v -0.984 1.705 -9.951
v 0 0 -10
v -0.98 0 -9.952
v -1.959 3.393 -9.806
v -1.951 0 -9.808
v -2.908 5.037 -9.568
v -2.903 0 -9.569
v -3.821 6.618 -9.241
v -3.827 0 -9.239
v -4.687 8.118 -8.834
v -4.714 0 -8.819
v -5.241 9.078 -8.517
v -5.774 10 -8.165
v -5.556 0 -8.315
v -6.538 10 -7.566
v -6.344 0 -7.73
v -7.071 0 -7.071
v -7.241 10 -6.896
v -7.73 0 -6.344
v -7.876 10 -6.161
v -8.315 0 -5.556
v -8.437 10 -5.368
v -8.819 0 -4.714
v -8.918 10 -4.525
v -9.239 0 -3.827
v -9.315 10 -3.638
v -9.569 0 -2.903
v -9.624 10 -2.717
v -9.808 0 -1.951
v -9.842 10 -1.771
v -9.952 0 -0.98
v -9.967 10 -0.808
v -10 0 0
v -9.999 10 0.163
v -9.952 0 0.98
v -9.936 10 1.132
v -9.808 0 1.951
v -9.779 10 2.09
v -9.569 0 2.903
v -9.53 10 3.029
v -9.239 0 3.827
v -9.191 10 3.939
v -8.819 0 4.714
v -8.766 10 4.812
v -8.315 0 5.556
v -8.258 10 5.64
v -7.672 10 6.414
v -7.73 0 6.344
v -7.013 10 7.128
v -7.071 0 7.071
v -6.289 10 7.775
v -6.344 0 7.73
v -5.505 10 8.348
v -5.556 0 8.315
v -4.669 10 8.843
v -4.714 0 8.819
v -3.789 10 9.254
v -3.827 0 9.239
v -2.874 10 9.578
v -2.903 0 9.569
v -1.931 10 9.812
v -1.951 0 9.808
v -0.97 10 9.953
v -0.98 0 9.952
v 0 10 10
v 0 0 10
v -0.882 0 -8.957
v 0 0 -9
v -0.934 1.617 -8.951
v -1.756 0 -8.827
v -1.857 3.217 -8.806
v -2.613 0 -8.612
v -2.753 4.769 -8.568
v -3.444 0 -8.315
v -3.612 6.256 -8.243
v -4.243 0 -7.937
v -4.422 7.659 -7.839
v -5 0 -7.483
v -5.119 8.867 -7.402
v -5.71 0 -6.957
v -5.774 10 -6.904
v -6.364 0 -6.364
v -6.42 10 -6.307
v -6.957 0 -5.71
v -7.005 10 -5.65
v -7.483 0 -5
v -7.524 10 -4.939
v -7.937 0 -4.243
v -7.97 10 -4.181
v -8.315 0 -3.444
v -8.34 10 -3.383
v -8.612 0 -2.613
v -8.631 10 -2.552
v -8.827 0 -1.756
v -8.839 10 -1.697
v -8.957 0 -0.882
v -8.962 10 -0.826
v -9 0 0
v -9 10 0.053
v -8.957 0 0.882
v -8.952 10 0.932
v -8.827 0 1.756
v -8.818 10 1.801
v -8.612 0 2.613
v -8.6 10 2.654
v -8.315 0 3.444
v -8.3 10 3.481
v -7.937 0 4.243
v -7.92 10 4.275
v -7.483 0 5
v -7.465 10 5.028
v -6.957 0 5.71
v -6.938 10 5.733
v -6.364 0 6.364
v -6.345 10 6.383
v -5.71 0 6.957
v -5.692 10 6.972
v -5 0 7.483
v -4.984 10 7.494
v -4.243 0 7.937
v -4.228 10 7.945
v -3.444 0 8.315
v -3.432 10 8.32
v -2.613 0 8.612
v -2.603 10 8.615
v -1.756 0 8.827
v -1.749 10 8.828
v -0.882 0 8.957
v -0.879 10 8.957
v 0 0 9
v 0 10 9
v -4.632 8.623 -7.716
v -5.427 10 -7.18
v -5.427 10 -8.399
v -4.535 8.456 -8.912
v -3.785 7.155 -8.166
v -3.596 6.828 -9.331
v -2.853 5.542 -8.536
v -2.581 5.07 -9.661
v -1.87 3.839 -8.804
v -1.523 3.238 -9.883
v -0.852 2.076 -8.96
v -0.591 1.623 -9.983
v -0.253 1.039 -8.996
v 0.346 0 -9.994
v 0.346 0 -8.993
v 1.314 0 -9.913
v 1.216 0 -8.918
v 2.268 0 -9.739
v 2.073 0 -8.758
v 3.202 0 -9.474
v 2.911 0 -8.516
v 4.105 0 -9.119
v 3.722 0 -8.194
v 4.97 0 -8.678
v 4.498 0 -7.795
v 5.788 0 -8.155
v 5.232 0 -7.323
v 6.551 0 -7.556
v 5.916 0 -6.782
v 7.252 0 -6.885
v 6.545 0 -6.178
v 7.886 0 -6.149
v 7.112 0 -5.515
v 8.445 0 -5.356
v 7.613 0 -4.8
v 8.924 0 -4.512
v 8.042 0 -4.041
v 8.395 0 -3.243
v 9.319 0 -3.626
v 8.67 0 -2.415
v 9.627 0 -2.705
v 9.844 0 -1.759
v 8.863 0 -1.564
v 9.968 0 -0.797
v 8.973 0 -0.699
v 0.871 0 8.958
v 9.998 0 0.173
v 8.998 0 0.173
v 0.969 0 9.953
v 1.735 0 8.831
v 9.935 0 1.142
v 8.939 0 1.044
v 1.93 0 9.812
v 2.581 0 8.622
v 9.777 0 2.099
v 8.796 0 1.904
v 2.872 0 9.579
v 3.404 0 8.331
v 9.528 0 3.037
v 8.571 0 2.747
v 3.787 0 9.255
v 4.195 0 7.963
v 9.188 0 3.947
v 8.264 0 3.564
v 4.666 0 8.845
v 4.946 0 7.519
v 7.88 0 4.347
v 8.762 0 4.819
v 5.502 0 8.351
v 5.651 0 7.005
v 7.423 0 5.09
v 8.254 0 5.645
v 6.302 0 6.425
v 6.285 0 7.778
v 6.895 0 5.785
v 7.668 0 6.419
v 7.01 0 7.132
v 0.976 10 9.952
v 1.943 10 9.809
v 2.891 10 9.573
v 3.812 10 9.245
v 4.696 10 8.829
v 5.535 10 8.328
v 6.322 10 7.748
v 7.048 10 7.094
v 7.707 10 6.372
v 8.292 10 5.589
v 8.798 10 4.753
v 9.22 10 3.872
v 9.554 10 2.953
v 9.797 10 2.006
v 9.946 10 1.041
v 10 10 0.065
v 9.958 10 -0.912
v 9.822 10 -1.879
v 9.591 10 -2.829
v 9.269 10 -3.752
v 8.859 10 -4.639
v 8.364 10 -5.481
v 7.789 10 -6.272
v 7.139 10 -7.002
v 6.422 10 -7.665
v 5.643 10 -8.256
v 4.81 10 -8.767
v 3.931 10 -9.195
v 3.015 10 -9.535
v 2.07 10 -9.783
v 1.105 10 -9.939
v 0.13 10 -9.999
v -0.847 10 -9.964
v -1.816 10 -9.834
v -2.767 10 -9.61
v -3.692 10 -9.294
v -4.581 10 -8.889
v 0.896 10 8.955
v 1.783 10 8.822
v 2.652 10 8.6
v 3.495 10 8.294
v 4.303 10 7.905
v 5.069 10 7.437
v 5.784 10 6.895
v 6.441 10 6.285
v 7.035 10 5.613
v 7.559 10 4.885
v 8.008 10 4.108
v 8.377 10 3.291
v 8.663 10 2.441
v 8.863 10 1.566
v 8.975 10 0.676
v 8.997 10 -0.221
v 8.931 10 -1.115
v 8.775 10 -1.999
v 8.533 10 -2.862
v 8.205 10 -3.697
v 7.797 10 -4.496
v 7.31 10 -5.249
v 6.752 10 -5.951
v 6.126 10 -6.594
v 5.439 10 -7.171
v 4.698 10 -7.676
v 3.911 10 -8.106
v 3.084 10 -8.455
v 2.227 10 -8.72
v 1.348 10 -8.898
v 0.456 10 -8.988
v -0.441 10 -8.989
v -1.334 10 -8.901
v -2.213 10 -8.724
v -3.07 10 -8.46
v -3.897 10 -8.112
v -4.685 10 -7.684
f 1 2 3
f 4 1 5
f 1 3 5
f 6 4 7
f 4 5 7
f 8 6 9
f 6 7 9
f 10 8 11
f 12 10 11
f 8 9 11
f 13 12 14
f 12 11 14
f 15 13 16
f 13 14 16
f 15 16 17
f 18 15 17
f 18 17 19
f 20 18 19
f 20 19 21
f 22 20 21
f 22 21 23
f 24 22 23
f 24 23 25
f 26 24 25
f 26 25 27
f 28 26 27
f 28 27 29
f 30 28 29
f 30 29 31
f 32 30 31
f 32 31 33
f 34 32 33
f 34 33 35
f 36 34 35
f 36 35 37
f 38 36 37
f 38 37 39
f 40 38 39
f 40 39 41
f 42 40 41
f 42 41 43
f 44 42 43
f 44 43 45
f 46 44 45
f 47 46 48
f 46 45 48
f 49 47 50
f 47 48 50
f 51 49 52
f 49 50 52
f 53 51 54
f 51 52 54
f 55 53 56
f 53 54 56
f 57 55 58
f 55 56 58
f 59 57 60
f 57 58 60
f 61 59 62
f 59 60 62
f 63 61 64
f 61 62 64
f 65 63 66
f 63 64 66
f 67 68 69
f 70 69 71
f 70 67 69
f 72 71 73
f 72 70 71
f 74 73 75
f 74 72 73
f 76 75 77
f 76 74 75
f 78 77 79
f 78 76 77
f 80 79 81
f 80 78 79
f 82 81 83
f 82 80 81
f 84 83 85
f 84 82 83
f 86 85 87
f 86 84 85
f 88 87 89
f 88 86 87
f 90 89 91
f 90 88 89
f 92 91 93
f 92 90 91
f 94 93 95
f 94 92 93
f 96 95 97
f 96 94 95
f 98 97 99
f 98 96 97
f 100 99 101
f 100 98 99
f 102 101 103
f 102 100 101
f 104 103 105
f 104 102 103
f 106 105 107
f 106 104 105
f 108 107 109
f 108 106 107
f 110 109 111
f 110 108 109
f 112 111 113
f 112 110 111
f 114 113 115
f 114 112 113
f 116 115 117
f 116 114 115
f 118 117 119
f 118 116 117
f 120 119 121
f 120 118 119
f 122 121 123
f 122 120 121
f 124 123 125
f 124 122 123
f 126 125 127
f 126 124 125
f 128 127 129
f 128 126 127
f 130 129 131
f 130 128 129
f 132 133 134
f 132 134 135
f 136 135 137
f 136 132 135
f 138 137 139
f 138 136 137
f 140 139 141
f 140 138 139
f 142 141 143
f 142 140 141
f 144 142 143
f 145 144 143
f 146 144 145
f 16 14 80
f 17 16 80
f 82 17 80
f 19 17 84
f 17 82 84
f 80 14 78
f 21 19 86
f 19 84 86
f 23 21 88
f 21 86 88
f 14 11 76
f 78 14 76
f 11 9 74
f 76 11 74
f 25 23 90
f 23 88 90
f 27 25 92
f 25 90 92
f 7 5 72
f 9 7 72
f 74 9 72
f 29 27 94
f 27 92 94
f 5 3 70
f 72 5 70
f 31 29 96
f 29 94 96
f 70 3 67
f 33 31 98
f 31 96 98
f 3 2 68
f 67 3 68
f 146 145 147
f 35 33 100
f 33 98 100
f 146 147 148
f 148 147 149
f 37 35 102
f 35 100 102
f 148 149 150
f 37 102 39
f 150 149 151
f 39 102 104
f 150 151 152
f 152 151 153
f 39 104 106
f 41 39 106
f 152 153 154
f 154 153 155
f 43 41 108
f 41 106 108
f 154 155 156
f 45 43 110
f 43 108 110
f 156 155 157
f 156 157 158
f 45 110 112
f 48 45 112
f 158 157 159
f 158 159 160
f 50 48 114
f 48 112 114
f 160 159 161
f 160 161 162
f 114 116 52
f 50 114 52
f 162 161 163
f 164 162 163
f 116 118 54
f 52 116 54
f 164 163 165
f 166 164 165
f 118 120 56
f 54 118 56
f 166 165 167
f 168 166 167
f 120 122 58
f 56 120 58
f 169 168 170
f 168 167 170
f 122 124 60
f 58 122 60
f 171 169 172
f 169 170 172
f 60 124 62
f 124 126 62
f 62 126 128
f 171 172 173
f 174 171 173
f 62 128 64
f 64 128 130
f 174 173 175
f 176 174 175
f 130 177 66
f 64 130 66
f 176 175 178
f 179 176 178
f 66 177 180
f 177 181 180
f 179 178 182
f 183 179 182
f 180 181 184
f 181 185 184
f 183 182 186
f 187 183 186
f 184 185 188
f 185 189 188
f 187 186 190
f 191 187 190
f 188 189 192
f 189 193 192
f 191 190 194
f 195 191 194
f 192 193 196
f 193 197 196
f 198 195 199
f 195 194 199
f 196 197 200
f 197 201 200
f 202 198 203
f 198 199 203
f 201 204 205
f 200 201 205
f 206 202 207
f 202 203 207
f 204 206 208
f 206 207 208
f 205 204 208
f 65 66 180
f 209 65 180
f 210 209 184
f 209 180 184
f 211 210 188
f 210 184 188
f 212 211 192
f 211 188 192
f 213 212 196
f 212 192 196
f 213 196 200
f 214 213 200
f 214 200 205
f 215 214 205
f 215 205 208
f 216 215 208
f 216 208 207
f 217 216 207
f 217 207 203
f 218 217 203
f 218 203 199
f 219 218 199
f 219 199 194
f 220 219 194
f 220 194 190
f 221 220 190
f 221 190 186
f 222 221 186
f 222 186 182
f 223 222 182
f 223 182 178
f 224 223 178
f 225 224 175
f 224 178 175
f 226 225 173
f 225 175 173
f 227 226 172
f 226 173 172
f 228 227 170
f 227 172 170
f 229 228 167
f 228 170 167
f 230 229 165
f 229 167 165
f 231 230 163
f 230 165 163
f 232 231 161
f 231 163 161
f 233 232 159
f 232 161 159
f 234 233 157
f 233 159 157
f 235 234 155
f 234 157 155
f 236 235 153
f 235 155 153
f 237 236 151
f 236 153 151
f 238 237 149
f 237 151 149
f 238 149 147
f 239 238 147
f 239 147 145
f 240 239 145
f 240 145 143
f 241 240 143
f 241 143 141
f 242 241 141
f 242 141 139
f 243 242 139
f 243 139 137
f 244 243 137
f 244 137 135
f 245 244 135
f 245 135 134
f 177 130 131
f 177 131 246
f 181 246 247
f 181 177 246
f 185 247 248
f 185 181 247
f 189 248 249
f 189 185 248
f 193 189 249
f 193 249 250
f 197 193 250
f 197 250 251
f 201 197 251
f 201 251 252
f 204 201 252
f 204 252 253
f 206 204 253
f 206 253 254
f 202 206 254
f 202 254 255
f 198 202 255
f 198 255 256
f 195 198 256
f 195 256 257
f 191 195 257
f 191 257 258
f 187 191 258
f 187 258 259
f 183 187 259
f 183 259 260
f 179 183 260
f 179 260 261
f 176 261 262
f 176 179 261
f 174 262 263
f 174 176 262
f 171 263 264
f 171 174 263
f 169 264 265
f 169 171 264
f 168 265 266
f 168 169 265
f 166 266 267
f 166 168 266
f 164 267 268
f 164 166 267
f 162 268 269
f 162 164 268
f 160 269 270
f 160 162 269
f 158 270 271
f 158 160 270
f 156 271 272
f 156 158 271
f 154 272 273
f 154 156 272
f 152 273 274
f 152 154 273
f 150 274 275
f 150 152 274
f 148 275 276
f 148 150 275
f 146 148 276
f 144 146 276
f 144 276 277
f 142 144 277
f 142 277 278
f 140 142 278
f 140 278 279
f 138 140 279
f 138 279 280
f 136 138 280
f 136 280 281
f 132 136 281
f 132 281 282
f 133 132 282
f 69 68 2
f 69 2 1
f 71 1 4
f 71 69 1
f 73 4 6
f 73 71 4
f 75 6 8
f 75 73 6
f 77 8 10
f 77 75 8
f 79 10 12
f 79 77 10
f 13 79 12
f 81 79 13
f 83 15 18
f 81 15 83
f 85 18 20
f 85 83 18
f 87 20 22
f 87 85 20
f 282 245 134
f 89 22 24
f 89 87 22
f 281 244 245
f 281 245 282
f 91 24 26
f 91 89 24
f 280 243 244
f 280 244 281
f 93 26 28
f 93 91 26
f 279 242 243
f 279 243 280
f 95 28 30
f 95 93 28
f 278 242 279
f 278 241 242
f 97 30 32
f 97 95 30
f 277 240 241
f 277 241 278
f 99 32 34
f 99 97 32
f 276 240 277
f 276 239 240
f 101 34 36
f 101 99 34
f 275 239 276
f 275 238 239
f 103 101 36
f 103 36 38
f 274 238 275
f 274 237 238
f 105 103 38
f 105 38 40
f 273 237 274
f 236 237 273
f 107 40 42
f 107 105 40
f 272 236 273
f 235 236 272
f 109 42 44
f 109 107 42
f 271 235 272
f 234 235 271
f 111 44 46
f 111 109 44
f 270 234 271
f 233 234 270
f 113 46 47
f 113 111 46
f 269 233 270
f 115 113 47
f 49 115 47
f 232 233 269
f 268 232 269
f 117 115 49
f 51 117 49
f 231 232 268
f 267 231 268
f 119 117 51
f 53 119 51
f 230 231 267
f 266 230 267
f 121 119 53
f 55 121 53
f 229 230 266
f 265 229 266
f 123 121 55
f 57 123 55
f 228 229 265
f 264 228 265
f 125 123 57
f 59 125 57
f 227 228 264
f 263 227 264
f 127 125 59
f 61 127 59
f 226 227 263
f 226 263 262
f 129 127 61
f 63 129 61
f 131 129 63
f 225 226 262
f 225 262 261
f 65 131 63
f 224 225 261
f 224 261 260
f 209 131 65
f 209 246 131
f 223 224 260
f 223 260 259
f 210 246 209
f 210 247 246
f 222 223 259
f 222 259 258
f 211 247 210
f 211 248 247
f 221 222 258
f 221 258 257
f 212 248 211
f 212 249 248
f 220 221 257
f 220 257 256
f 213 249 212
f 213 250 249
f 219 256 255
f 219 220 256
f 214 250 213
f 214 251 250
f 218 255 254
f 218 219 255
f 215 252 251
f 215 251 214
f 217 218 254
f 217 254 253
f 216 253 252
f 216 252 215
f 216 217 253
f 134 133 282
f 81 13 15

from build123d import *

# Parameters (mm, degrees)
SKETCH1_R           = 10
SKETCH1_R_2         = 9
BOSS_EXTRUDE1_DEPTH = 10
CUT_EXTRUDE1_REACH  = 19.321


with BuildPart() as part:
    # Sketch1 → Boss-Extrude1 (new body)
    with BuildSketch(Plane(origin=(0, 0, 0), x_dir=(1, 0, 0), z_dir=(0, 1, 0))):
        with Locations(Location((0, 0, 0), (0, 0, 270))):
            Circle(SKETCH1_R)
        with Locations(Location((0, 0, 0), (0, 0, 270))):
            Circle(SKETCH1_R_2, mode=Mode.SUBTRACT)
    extrude(amount=BOSS_EXTRUDE1_DEPTH)

    # Sketch3 → Cut-Extrude1 (cut, up to next)
    with BuildSketch(Plane.XY, mode=Mode.PRIVATE) as cut_extrude1_sk1:
        Polygon((0, 0), (-5.773502692, 10), (-5.42709253, 10), (0.346410162, 0), align=None)
    cut_extrude1_tool1 = extrude(cut_extrude1_sk1.sketch, amount=-CUT_EXTRUDE1_REACH, mode=Mode.PRIVATE) & part.part
    add(cut_extrude1_tool1.solids().sort_by_distance((-2.713546, 5, 0))[0], mode=Mode.SUBTRACT)


solid = part.part
